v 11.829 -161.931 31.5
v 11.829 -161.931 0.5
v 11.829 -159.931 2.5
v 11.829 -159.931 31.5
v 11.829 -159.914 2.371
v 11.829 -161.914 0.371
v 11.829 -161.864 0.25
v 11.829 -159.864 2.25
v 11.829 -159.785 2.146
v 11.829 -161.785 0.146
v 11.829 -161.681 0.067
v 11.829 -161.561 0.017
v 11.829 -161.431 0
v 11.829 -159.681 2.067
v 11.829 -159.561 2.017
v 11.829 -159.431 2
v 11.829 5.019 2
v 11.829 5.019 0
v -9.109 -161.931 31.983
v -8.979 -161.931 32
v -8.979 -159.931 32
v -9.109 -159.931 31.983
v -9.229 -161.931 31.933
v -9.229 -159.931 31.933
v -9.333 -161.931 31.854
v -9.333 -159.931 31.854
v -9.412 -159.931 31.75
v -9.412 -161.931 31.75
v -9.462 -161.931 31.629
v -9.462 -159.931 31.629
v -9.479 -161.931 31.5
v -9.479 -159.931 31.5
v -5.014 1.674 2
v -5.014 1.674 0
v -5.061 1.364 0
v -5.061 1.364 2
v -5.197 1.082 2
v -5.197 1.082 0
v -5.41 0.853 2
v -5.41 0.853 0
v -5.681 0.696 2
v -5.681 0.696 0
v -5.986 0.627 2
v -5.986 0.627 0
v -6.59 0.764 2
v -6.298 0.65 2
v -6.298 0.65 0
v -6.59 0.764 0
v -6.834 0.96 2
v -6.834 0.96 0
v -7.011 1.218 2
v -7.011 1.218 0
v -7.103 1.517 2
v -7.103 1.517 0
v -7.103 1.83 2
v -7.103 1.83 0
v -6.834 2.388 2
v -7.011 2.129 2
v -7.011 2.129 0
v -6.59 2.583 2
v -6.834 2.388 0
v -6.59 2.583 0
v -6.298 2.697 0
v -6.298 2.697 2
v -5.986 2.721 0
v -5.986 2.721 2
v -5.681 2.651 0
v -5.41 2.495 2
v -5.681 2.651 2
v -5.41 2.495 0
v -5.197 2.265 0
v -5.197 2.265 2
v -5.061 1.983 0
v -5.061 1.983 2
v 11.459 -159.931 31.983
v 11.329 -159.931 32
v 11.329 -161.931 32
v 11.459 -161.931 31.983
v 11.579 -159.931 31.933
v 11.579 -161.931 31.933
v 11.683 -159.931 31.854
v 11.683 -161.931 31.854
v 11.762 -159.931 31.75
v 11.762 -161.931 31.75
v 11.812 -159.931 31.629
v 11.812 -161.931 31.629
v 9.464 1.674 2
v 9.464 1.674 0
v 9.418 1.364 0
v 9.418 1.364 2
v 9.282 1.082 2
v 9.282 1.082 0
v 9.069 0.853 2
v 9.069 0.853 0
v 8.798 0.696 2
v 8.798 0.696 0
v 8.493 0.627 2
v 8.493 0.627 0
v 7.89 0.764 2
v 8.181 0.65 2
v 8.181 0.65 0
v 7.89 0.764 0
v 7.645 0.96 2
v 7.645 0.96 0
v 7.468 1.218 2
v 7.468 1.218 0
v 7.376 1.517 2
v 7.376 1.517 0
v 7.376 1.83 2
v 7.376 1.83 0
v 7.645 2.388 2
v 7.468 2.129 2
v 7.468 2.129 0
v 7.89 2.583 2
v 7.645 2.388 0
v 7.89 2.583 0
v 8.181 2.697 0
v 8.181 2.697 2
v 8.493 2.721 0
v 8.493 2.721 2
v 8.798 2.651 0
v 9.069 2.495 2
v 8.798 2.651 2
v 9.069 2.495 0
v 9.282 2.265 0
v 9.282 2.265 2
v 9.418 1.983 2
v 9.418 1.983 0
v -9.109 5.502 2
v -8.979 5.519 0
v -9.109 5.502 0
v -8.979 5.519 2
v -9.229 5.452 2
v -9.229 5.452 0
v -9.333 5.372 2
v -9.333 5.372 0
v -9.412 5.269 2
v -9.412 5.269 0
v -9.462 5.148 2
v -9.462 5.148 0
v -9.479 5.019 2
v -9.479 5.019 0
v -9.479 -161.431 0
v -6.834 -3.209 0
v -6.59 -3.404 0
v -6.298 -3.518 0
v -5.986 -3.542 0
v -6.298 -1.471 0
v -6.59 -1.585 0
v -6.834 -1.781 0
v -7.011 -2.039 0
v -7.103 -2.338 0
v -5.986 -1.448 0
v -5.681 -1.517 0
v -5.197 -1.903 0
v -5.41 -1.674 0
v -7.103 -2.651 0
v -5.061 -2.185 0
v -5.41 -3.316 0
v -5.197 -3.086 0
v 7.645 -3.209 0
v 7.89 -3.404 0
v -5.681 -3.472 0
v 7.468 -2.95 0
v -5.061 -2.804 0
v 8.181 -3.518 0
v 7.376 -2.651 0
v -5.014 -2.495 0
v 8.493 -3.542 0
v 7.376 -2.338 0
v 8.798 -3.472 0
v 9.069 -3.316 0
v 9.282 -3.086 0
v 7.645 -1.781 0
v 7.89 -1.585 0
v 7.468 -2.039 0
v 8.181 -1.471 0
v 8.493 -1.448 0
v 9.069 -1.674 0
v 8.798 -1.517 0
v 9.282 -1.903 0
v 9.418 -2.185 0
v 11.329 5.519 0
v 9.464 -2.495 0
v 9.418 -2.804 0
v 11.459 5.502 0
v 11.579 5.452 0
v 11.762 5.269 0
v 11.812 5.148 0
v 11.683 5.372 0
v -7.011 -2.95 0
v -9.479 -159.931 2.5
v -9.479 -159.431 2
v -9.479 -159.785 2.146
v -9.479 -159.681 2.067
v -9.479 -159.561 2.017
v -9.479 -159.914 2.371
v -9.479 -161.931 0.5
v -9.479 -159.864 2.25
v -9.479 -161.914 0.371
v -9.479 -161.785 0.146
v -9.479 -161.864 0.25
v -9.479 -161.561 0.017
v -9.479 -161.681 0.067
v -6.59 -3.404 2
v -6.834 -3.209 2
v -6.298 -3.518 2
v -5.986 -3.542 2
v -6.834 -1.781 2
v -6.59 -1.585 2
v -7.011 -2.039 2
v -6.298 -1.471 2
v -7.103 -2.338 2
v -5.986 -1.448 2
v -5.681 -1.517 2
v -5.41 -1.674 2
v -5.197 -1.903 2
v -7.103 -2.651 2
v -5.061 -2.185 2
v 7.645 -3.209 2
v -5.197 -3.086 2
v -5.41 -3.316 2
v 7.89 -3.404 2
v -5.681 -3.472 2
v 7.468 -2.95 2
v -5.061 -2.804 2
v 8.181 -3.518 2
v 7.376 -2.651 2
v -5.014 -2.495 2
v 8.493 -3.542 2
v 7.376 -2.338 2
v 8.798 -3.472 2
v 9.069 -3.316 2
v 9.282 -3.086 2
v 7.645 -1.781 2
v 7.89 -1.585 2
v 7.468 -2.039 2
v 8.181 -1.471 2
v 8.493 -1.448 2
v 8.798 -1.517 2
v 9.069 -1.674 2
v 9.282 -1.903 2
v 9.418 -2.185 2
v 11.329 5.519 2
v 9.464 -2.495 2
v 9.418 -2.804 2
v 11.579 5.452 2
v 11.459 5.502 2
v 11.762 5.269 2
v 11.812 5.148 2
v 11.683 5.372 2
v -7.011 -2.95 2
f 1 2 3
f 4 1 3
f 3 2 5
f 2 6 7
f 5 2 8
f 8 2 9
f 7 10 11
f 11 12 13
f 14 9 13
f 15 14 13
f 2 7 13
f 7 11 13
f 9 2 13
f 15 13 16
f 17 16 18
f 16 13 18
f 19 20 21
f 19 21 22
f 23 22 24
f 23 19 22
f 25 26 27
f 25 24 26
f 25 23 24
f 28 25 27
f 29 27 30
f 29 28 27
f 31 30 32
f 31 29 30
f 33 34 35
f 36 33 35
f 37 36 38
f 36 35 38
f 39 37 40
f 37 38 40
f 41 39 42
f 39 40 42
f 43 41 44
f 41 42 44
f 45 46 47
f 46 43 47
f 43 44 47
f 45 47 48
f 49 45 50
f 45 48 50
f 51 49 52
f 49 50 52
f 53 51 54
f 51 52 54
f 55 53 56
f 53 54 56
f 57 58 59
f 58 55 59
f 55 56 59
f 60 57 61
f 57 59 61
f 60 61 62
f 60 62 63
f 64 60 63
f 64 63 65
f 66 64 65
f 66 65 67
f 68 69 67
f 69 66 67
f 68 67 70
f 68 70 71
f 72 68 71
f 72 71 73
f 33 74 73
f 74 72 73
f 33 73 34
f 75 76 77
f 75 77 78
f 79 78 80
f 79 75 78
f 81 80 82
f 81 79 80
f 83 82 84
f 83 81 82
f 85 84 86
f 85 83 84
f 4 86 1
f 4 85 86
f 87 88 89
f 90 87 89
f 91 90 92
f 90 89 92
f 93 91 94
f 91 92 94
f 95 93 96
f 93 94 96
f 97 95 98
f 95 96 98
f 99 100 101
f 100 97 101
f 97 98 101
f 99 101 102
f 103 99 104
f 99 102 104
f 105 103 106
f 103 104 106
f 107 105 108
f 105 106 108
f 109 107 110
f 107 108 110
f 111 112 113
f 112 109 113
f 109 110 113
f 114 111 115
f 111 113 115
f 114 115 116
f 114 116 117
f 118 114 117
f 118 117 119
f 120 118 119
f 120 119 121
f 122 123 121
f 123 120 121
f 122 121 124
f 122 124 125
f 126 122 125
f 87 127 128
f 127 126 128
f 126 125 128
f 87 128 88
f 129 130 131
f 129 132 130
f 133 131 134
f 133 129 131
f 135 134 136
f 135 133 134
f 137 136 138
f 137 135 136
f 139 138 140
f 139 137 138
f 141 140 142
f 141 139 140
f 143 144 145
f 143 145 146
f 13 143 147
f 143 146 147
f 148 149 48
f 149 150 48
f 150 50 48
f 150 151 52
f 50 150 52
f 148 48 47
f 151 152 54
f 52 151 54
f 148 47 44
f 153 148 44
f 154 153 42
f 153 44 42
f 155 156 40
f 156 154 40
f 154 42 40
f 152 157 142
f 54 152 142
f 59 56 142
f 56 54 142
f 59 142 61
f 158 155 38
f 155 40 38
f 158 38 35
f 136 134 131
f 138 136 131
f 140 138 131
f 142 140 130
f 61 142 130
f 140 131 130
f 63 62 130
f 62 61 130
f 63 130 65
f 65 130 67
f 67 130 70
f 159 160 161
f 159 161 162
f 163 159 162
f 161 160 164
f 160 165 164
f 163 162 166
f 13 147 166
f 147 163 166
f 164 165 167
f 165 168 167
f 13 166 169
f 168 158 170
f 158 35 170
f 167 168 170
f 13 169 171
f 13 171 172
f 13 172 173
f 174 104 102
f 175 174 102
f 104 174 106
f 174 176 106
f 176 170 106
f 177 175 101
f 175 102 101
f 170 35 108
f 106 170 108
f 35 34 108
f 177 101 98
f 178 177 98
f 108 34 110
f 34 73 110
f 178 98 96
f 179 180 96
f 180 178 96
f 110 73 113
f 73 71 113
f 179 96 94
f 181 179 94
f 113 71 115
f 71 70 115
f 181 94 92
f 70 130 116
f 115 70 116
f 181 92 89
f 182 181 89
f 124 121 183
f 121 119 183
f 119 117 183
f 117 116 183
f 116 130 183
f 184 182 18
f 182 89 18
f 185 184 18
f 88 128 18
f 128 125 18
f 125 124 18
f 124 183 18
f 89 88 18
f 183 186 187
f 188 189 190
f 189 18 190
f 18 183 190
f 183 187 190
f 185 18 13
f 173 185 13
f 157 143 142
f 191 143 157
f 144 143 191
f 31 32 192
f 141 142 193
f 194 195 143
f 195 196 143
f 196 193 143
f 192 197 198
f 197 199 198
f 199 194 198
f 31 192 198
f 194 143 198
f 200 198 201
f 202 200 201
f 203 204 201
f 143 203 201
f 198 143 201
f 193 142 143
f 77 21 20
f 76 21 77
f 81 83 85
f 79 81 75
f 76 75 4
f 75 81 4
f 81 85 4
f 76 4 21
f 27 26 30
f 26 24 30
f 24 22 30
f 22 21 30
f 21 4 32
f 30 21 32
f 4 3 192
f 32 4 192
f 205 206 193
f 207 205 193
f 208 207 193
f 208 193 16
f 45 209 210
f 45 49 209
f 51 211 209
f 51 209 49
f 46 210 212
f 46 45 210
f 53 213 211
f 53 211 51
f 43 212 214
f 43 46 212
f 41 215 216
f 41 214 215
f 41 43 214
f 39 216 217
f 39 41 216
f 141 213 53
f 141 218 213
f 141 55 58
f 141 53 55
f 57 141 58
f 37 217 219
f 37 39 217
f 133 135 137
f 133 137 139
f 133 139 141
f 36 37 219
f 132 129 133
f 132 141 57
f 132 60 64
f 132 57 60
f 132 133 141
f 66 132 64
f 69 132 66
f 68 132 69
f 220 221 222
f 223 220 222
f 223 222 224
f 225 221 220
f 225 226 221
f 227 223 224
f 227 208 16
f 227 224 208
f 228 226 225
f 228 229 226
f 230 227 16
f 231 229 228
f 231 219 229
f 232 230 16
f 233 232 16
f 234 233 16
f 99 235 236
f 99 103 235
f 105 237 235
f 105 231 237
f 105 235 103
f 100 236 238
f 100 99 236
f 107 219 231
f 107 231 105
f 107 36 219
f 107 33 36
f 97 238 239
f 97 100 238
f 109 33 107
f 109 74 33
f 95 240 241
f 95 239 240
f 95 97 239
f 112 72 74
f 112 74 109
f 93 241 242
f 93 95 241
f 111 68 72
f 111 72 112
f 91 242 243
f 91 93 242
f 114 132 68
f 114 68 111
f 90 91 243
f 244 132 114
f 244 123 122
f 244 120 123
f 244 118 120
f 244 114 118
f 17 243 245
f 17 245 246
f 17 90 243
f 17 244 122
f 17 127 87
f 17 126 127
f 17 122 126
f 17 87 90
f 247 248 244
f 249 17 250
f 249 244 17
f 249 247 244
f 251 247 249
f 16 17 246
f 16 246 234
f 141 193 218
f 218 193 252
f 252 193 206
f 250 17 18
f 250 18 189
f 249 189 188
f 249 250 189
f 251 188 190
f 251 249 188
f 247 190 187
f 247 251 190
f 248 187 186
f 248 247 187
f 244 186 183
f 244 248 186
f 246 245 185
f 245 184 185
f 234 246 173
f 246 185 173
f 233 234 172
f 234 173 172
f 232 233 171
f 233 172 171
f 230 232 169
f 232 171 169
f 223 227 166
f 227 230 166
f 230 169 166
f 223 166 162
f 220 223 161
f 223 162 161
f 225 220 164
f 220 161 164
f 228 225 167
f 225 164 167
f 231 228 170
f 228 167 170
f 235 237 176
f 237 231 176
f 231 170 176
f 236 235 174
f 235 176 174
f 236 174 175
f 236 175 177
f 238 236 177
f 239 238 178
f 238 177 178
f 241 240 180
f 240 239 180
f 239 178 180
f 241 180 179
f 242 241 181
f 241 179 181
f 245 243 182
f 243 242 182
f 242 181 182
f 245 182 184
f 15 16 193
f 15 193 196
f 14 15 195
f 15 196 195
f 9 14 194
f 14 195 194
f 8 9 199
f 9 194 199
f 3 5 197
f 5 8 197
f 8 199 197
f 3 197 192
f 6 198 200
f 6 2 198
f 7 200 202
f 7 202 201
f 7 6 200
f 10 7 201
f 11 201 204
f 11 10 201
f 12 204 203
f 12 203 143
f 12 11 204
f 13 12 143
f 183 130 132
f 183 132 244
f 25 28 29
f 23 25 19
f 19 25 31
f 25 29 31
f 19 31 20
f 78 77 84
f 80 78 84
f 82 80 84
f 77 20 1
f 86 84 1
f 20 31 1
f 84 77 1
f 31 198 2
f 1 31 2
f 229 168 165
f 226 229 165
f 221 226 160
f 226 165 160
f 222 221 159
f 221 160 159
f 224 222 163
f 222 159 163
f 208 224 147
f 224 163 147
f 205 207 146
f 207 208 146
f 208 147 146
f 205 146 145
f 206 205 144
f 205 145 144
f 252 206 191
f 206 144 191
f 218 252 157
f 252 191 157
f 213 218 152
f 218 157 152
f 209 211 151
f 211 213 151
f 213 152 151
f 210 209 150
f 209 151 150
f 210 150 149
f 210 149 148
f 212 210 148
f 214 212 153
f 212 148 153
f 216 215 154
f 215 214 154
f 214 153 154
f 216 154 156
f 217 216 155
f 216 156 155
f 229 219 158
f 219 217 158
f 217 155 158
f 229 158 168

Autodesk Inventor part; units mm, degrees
ref_plane "YZ Plane" through (0, 0, 0) normal (1, 0, 0) x (0, 1, 0)
ref_plane "XZ Plane" through (0, 0, 0) normal (0, 1, 0) x (-1, 0, 0)
ref_plane "XY Plane" through (0, 0, 0) normal (0, 0, 1) x (1, 0, 0)
sketch "Sketch2" plane through (0, 0, 0) normal (0, 0, 1) x (1, 0, 0)
  line L0 (-9.4794, 5.5186) -> (11.8294, 5.5186)
  circle A0 centre (-6.0645, -2.4947) radius 1.05
  circle A1 centre (8.4145, -2.4947) radius 1.05
  circle A2 centre (8.4145, 1.6737) radius 1.05
  circle A3 centre (-6.0645, 1.6737) radius 1.05
  line L1 (-9.4794, 5.5186) -> (-9.4794, -157.7914)
  line L2 (11.8294, -157.7914) -> (11.8294, 5.5186)
  line L3 (-9.4794, -157.7914) -> (-9.4794, -161.9314)
  line L4 (-9.4794, -161.9314) -> (11.8294, -161.9314)
  line L5 (11.8294, -161.9314) -> (11.8294, -157.7914)
  point P0 (0, 0)
  dimension "d20" = 163.31
  dimension "d31" = 4.14
  dimension "d37" = 2.1
  dimension "d38" = 2.1
  dimension "d39" = 2.1
  dimension "d40" = 2.1
extrude "Extrusion1" add sketch "Sketch2" along normal blind 2
fillet "Fillet6" radius 0.5 2 edges at (11.8294, 5.5186, 1) (-9.4794, 5.5186, 1)
sketch "Sketch9" plane through (0, 0, 2) normal (0, 0, 1) x (1, 0, 0)
  line L0 (-9.4794, -161.9314) -> (11.8294, -161.9314) projected
  line L1 (-9.4794, -161.9314) -> (11.8294, -161.9314)
  line L2 (11.8294, -161.9314) -> (11.8294, -159.9314)
  line L3 (11.8294, -159.9314) -> (-9.4794, -159.9314)
  line L4 (-9.4794, -159.9314) -> (-9.4794, -161.9314)
  point P0 (0, 0)
  dimension "d32" = 2
extrude "Extrusion7" add sketch "Sketch9" along normal blind 30
sketch "Sketch10" plane through (-9.4794, -159.9314, 2) normal (0, 1, 0) x (1, 0, 0)
  point P0 (9.4794, 2)
fillet "Fillet10" radius 0.5 2 edges at (1.175, -159.9314, 2) (1.175, -161.9314, 0)
fillet "Fillet11" radius 0.5 2 edges at (-9.4794, -160.9314, 32) (11.8294, -160.9314, 32)
properties part number "Bracket Holder" material "Aluminum 6061"
